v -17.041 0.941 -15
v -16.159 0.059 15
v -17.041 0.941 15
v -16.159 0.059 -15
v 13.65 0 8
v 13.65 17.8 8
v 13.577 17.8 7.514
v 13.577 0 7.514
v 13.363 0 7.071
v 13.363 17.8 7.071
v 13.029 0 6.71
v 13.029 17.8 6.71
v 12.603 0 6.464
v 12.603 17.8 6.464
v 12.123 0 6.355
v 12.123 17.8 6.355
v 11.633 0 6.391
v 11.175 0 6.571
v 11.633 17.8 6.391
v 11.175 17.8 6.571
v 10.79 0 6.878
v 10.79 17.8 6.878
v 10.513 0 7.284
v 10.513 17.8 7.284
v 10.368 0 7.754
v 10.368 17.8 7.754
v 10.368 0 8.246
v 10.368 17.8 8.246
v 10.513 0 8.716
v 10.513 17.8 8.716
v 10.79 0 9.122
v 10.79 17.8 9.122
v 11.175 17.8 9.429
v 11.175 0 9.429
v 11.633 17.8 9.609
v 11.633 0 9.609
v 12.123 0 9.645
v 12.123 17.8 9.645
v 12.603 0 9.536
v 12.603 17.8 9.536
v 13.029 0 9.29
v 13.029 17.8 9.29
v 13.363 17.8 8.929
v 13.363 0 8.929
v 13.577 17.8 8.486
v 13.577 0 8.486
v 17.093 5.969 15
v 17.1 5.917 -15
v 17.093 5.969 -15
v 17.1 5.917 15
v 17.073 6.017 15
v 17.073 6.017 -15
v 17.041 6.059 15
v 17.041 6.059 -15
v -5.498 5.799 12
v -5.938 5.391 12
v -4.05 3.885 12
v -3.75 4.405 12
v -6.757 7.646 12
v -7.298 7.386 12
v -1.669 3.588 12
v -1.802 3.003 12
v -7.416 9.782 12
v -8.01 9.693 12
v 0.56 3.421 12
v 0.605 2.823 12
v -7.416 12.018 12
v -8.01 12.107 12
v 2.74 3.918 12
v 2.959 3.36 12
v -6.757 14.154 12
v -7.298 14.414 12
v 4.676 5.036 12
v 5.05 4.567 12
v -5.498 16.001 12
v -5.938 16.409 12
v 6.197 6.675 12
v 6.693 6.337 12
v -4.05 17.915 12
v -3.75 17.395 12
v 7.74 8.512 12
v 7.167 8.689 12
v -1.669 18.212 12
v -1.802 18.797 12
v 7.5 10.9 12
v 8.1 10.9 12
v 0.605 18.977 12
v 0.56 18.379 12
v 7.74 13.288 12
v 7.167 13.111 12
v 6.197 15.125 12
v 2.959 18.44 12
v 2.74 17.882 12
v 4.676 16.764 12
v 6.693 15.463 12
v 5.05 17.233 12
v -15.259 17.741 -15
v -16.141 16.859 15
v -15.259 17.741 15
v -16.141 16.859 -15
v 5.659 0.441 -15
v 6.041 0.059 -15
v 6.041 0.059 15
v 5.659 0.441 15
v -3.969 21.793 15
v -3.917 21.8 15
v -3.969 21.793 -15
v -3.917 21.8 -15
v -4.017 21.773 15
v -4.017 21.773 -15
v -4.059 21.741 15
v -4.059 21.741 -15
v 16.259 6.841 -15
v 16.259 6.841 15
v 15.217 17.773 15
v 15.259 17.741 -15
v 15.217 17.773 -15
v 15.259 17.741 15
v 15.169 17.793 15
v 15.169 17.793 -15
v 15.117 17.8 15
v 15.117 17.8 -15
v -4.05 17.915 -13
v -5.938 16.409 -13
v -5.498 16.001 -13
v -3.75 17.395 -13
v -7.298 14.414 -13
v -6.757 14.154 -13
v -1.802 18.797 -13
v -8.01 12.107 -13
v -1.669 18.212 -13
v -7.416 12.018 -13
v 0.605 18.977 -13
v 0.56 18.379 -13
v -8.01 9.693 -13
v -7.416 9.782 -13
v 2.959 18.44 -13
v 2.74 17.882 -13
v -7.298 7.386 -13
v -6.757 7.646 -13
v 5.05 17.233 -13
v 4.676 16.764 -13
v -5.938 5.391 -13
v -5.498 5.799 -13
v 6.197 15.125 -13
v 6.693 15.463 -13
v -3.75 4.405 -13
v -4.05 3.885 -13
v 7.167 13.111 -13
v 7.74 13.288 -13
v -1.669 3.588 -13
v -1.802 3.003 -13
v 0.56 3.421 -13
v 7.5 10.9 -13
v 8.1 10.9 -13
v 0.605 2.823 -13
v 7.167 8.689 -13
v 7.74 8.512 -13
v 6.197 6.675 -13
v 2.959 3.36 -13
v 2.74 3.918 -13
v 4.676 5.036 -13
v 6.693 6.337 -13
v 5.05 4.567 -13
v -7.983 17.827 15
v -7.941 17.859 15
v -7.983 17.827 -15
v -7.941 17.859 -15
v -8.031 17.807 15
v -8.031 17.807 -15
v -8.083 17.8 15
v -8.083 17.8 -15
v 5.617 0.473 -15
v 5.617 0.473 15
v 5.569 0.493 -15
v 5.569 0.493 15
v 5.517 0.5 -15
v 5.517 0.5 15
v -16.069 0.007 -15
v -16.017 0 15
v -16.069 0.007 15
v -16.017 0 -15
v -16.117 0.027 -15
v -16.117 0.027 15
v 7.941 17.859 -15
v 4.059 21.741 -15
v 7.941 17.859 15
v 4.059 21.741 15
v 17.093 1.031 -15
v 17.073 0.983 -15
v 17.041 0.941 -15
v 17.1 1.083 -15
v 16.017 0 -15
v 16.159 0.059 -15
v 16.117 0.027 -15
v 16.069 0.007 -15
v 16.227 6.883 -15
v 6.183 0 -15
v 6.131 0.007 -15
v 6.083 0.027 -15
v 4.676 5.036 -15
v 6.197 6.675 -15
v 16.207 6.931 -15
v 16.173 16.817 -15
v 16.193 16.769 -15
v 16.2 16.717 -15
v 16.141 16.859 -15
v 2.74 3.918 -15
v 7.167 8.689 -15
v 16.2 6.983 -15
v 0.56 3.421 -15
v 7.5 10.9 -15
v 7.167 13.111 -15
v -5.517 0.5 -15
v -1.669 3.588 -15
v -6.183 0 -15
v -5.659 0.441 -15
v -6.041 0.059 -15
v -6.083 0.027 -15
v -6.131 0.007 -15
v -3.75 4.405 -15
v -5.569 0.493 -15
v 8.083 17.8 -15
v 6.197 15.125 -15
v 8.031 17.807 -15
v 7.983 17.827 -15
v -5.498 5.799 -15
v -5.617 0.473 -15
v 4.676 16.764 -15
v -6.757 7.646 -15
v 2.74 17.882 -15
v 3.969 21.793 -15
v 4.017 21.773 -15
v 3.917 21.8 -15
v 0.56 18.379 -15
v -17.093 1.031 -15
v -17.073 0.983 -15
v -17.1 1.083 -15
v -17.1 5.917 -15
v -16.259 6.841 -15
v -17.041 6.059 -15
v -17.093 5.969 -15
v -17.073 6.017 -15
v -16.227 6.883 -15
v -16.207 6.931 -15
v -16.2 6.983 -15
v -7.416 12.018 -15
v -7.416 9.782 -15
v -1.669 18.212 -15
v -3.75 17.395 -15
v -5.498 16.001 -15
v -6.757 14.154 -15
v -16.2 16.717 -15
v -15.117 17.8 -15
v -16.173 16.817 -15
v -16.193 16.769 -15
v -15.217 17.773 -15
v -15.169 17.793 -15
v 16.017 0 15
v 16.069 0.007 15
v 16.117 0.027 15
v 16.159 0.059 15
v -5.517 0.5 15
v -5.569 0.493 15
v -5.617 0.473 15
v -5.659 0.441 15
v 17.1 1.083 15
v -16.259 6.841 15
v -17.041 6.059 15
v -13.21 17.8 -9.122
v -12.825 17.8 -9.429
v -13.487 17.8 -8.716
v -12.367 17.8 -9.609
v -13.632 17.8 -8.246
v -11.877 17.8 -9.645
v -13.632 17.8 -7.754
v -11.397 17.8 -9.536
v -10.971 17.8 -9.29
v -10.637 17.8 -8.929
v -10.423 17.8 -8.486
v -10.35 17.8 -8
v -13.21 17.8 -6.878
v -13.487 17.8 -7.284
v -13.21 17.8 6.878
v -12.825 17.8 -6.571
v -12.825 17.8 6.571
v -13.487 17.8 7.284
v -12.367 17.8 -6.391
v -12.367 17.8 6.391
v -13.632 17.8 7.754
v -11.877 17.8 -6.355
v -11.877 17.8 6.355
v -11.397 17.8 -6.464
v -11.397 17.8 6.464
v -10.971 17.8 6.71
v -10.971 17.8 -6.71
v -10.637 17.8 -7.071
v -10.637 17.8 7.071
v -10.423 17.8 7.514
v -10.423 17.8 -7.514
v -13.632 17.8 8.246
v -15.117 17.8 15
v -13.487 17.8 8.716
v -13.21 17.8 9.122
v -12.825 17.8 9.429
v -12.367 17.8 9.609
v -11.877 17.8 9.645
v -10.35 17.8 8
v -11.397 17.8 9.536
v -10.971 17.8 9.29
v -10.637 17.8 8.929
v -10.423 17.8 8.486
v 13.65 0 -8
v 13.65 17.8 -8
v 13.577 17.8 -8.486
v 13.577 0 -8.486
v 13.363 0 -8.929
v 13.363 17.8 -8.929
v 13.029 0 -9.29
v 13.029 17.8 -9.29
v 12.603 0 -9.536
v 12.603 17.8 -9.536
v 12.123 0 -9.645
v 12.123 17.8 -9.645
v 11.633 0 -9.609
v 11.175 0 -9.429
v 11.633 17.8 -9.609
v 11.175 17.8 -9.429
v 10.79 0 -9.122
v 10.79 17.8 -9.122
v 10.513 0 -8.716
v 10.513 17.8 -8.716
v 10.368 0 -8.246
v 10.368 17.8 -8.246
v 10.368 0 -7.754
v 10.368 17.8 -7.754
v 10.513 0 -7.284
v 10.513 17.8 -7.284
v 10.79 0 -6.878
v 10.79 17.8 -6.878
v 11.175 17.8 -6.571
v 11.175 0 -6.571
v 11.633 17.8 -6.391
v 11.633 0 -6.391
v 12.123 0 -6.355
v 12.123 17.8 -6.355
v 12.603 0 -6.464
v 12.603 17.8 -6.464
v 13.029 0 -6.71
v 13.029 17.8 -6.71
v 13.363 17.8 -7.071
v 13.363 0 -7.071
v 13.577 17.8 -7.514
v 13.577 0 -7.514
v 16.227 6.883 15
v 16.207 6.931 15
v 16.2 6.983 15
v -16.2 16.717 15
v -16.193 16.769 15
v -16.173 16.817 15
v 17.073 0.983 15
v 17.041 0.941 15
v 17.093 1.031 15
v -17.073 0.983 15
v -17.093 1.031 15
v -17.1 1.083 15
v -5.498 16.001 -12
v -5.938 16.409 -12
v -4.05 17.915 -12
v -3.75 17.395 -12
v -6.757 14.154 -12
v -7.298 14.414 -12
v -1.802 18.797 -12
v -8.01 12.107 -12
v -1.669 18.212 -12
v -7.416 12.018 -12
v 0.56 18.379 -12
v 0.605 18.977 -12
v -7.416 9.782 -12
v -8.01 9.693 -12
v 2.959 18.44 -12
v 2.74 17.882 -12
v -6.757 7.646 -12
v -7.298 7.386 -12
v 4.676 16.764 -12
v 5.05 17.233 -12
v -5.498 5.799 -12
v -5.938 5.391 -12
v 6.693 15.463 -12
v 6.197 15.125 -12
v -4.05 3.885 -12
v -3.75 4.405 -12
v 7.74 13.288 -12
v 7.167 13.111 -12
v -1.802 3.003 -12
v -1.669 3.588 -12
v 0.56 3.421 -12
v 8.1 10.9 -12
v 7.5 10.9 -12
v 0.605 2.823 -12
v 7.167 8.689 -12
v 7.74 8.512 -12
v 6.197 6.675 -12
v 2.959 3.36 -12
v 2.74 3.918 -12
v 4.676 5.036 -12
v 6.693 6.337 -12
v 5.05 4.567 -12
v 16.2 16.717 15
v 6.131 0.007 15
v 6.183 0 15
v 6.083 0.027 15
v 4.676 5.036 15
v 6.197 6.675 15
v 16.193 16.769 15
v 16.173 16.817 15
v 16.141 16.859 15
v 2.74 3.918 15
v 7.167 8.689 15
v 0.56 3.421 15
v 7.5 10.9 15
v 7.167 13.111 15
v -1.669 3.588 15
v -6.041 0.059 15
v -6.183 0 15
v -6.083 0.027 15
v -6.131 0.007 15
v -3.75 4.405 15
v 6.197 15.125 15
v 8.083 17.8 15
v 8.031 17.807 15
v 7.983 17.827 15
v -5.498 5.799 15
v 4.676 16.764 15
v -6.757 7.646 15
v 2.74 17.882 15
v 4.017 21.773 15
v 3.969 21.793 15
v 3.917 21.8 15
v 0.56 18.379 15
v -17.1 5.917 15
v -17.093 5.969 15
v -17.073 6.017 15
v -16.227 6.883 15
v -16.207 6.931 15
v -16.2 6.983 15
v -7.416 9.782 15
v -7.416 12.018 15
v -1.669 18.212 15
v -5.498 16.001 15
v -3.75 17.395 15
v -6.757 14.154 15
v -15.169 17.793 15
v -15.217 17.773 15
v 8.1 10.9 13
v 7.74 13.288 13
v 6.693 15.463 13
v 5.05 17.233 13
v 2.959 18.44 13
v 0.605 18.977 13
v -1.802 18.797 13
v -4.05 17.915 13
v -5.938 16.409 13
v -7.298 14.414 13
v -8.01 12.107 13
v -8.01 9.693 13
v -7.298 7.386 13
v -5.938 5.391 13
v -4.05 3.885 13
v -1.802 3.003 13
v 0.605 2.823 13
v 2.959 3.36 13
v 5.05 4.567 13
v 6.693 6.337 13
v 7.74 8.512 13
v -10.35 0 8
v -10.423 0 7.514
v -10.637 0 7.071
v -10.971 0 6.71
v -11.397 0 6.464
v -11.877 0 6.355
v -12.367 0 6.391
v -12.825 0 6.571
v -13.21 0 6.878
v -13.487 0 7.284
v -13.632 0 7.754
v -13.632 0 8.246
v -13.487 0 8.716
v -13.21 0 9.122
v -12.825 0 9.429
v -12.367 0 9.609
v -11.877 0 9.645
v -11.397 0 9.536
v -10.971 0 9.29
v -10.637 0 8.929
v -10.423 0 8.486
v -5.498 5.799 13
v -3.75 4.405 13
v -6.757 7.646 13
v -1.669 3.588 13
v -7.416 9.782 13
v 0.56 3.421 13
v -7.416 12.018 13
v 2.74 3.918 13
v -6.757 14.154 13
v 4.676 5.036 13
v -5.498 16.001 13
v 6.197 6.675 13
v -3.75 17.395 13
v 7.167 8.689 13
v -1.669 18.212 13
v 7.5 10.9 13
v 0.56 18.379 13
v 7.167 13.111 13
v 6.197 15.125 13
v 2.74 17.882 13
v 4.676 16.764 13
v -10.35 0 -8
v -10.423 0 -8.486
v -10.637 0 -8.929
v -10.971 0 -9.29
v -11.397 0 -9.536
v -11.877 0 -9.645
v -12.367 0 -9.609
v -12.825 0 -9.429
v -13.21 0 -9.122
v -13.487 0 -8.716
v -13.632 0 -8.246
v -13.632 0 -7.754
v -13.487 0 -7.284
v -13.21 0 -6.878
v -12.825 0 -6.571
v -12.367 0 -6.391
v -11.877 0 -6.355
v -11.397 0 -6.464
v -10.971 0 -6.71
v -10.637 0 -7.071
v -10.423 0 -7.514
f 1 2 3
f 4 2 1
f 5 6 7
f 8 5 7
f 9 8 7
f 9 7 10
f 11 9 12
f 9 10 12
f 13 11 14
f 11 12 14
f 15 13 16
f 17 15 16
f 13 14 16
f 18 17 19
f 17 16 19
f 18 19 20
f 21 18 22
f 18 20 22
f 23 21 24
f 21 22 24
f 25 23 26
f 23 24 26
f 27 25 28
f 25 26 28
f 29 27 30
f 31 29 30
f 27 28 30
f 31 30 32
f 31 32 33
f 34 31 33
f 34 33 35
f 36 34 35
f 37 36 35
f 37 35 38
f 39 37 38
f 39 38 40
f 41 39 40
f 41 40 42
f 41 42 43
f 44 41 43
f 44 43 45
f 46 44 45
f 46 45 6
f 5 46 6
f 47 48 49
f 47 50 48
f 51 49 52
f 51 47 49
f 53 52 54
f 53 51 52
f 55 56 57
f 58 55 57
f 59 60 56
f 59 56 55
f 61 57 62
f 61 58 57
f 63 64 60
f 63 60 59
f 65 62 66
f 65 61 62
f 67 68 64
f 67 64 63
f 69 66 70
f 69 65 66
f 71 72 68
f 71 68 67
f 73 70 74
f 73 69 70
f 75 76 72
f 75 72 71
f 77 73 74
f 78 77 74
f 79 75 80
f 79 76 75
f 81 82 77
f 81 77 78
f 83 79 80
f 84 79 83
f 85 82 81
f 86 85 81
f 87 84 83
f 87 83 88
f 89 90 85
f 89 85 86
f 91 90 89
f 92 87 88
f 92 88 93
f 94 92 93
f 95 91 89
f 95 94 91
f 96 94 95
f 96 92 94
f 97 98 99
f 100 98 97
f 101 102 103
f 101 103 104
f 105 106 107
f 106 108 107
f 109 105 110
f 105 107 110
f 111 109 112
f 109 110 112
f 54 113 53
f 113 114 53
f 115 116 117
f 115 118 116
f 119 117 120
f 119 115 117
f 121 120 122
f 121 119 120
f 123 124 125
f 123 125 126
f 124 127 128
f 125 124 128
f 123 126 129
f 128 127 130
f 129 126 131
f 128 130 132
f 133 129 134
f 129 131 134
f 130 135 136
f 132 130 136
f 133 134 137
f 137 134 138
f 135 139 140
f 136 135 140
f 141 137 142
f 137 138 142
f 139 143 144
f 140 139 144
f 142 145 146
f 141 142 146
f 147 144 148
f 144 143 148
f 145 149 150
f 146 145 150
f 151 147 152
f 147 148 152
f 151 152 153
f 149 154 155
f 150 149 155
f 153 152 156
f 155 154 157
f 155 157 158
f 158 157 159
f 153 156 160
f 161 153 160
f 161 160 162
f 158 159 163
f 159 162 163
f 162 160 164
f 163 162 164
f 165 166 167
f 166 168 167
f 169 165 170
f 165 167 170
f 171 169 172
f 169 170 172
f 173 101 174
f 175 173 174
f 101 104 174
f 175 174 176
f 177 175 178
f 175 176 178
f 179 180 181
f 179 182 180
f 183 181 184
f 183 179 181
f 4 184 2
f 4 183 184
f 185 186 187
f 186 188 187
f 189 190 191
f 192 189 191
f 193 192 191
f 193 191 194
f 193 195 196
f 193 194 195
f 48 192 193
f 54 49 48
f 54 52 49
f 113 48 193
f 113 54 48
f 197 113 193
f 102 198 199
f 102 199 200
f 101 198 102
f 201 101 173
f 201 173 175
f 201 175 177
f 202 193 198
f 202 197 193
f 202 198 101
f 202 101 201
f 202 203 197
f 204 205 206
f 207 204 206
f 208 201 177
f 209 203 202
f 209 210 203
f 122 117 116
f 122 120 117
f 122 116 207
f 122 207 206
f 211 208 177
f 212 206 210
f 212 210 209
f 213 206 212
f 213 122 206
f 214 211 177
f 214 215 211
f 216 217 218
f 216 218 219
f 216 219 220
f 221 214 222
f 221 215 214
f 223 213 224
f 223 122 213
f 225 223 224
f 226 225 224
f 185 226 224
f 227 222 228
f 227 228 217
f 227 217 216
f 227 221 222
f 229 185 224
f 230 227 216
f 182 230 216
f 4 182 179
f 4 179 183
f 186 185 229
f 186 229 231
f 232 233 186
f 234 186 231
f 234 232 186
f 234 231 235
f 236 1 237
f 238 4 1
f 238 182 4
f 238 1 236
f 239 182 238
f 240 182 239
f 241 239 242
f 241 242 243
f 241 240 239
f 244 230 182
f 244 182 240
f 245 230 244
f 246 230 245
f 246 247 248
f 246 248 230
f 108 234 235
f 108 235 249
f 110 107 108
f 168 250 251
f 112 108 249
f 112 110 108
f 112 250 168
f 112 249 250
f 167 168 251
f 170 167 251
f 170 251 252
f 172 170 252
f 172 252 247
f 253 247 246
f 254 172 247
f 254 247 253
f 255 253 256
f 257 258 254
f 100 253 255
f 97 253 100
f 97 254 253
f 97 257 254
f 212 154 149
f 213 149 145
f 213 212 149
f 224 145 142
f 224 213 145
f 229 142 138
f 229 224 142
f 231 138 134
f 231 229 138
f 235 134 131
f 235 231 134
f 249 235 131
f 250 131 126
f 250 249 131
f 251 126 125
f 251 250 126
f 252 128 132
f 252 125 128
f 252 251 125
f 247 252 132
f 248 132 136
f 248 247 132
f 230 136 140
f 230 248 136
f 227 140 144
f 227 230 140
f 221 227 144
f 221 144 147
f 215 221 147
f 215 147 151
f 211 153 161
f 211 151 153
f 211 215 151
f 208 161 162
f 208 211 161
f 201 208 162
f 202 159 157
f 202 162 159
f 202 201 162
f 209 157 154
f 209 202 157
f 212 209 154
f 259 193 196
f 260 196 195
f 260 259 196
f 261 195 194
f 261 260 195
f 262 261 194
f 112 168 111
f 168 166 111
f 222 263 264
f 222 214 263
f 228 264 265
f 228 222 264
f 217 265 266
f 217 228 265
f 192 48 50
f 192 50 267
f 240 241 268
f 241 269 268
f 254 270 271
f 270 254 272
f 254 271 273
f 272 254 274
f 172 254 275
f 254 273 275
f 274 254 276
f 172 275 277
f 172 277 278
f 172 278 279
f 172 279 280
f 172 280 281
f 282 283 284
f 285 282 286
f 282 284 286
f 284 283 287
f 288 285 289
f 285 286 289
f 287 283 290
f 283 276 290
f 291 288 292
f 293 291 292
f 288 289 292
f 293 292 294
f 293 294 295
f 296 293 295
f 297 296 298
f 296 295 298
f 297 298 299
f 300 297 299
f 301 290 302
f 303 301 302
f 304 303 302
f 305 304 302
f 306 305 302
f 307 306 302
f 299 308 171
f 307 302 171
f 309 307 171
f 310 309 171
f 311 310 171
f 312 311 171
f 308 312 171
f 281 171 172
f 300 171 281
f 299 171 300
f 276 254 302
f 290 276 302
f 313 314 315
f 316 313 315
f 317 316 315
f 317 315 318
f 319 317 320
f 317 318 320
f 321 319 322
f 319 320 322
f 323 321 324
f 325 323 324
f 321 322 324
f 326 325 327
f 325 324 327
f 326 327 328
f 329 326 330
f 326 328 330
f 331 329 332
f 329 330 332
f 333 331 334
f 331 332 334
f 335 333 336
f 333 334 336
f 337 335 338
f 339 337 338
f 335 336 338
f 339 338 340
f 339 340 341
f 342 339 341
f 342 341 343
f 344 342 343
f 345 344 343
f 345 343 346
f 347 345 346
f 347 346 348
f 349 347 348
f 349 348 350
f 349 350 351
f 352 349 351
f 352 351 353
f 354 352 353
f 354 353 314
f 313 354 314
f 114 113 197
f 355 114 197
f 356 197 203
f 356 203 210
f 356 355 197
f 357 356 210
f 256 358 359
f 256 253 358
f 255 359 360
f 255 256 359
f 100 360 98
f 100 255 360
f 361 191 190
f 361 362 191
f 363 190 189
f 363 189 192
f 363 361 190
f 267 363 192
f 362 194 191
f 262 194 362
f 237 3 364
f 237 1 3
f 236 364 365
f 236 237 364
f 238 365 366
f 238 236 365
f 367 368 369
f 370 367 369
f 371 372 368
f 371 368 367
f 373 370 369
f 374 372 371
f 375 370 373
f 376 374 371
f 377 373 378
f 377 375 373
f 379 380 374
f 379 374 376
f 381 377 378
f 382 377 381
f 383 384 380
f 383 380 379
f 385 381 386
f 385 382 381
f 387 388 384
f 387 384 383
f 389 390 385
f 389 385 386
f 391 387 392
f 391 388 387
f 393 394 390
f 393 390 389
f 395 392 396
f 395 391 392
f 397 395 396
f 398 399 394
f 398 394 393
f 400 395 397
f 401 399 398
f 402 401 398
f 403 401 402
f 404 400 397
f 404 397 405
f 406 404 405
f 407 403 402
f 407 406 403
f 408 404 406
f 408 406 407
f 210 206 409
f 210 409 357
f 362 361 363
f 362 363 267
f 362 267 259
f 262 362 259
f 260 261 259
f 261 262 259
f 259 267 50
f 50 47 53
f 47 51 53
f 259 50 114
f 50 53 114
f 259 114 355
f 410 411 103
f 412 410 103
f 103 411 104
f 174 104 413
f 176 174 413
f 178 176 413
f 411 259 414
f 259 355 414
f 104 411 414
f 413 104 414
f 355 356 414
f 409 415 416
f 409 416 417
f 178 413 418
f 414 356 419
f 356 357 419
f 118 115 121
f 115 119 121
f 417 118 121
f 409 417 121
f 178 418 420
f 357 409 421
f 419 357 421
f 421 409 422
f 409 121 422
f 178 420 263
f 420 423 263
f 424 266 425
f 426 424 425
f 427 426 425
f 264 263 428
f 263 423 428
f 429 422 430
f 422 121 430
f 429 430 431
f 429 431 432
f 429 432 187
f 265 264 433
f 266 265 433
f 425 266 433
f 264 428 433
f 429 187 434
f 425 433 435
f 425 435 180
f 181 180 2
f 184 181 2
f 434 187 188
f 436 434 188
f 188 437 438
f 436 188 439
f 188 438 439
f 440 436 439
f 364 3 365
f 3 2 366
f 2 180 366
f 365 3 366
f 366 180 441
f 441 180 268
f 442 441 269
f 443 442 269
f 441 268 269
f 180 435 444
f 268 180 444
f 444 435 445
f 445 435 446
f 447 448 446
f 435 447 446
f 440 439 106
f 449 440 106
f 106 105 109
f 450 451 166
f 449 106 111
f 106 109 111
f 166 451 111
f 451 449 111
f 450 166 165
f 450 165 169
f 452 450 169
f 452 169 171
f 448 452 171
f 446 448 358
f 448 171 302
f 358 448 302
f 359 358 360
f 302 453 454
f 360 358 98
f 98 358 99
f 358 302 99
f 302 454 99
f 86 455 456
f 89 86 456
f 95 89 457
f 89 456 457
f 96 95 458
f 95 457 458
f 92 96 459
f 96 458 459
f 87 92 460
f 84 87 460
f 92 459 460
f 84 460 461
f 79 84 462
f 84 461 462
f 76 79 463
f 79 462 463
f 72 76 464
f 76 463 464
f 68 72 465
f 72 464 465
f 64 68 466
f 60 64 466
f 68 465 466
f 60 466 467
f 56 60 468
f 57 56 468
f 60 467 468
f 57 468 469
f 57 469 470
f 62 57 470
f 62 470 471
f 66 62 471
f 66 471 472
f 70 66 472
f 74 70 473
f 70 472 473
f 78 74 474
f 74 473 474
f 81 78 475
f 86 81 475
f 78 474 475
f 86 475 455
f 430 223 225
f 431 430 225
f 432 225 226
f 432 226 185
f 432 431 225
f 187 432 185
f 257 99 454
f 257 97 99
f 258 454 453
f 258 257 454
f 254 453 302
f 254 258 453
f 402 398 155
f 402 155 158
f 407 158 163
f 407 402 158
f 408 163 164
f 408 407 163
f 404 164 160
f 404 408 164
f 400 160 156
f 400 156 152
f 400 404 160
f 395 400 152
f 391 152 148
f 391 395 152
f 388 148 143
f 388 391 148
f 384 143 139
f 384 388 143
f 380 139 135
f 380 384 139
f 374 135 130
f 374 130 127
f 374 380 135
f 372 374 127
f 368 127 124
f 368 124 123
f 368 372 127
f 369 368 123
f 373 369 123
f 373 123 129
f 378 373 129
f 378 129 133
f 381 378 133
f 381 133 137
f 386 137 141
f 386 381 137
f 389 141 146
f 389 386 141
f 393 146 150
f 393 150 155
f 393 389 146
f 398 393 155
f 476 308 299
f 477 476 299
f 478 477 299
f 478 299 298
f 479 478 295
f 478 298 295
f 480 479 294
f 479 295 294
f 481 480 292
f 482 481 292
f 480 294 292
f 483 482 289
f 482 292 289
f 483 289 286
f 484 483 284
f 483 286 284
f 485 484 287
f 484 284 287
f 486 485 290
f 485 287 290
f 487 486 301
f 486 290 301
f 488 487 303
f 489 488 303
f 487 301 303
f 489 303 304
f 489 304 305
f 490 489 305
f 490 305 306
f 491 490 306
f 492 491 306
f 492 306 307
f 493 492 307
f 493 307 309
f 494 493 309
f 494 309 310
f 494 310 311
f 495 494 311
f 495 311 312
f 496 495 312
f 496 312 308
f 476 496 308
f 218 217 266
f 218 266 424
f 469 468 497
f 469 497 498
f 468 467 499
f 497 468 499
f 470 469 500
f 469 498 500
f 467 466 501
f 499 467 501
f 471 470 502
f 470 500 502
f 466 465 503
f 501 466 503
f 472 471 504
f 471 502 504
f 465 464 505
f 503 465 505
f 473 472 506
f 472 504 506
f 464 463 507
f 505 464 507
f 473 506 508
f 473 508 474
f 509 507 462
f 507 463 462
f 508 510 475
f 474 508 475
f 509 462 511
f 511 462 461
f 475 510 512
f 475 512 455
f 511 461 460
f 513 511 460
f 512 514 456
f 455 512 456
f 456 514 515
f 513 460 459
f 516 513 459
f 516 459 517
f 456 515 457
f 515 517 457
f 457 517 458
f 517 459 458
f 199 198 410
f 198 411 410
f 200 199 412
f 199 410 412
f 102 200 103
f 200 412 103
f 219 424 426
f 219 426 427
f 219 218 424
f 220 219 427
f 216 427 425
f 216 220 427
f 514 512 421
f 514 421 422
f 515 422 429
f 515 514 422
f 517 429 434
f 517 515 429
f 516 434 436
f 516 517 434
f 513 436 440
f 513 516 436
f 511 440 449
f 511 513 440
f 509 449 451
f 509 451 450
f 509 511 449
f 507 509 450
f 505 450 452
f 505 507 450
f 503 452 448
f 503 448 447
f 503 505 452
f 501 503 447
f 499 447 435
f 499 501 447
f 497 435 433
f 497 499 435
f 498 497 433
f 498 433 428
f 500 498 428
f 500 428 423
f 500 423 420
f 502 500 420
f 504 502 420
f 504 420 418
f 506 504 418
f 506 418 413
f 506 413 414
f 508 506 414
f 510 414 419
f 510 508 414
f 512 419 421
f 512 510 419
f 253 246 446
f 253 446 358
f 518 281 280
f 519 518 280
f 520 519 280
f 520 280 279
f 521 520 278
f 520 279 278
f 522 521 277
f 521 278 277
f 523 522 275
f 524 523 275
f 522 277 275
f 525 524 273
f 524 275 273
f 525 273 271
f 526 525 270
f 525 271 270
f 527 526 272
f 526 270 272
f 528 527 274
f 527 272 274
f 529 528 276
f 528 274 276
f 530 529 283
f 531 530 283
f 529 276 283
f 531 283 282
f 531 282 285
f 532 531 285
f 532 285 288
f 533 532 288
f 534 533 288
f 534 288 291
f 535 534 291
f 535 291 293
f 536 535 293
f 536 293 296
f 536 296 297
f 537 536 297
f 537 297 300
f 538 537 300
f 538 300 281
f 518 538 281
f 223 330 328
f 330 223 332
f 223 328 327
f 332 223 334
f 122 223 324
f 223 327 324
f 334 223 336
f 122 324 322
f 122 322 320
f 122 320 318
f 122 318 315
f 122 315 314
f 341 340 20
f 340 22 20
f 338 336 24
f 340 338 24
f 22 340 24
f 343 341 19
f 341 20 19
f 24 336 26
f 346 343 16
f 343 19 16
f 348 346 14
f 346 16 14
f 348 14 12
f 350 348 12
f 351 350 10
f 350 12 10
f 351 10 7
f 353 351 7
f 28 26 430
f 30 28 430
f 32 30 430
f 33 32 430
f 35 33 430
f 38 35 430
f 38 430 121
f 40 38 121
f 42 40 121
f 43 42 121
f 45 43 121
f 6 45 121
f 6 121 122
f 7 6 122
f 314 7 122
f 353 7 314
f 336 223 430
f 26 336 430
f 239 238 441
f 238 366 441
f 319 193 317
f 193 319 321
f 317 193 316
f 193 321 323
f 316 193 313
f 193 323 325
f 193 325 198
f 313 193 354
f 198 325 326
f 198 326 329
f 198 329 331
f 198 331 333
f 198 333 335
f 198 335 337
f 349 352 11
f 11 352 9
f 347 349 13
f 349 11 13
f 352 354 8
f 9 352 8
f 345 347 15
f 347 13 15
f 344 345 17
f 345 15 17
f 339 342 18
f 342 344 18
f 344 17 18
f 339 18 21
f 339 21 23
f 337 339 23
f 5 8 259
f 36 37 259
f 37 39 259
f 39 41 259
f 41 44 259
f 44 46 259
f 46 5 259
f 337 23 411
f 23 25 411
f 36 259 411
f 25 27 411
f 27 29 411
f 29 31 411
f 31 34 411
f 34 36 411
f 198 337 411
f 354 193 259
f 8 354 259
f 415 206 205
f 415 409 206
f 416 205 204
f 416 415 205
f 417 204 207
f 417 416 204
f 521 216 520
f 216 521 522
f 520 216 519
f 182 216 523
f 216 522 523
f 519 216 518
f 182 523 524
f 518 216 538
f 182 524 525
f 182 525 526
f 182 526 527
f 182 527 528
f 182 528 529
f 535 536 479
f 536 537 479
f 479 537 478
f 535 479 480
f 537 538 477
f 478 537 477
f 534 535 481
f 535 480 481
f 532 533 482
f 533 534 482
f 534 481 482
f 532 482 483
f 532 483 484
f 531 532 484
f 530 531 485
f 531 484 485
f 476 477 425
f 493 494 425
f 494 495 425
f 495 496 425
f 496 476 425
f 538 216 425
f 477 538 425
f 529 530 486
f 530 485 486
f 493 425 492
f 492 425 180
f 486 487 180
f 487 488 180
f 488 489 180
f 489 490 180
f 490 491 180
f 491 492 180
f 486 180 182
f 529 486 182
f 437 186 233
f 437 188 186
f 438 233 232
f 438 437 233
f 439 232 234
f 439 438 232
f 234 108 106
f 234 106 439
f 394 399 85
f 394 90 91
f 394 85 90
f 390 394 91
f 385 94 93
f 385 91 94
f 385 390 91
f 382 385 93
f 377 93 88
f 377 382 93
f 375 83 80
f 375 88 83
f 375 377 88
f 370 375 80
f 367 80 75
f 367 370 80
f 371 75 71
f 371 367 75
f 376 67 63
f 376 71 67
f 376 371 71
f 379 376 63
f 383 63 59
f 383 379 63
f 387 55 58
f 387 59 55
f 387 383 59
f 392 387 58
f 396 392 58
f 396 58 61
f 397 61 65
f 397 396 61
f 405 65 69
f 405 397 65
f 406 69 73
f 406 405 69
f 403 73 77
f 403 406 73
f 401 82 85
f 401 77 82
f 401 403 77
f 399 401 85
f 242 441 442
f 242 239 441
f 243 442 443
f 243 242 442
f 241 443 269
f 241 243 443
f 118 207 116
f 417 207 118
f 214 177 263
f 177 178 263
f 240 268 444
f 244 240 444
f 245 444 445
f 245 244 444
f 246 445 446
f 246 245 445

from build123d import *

# Parameters (mm, degrees)
ESQUISSE1_R             = 7.5
BOSS_EXTRU_1_DEPTH      = 15
CHANFREIN1_SIZE         = 1
CONG_1_R                = 0.2
ESQUISSE2_R             = 8.1
ENL_V_MAT_EXTRU_1_DEPTH = 1
ENL_V_START             = -1
ESQUISSE3_R             = 8.1
ENL_V_MAT_EXTRU_2_DEPTH = 1
TROU_TARAUD_M41_D       = 3.3


with BuildPart() as part:
    # Esquisse1 → Boss.-Extru.1 (new, symmetric)
    with BuildSketch(Plane.XY):
        Polygon((5.6, 0.5), (-5.6, 0.5), (-6.1, 0), (-17.1, 0), (-17.1, 6), (-16.2, 6.9), (-16.2, 17.8), (-8, 17.8), (-4, 21.8), (4, 21.8), (8, 17.8), (16.2, 17.8), (16.2, 6.9), (17.1, 6), (17.1, 0), (6.1, 0), align=None)
        with Locations((0, 10.9)):
            Circle(ESQUISSE1_R, mode=Mode.SUBTRACT)
    extrude(amount=BOSS_EXTRU_1_DEPTH, both=True)

    # Chanfrein1
    chanfrein1_edges = [part.edges().sort_by_distance(p)[0] for p in [
        (-17.1, 0, 0),
        (-16.2, 17.8, 0),
        (16.2, 17.8, 0),
        (17.1, 0, 0),
    ]]
    chamfer(chanfrein1_edges, length=CHANFREIN1_SIZE)

    # Congé1
    cong_1_edges = [part.edges().sort_by_distance(p)[0] for p in [
        (6.1, 0, 0),
        (5.6, 0.5, 0),
        (-5.6, 0.5, 0),
        (-6.1, 0, 0),
        (-17.1, 6, 0),
        (-16.2, 6.9, 0),
        (-8, 17.8, 0),
        (-4, 21.8, 0),
        (4, 21.8, 0),
        (8, 17.8, 0),
        (16.2, 6.9, 0),
        (17.1, 6, 0),
        (17.1, 1, 0),
        (16.1, 0, 0),
        (-16.1, 0, 0),
        (-17.1, 1, 0),
        (-16.2, 16.8, 0),
        (-15.2, 17.8, 0),
        (15.2, 17.8, 0),
        (16.2, 16.8, 0),
    ]]
    fillet(cong_1_edges, radius=CONG_1_R)

    # Esquisse2 → Enlèv. mat.-Extru.1 (cut)
    with BuildSketch(Plane.XY.offset(13)):
        with Locations((0, 10.9)):
            Circle(ESQUISSE2_R)
    extrude(amount=-ENL_V_MAT_EXTRU_1_DEPTH, mode=Mode.SUBTRACT)

    # Esquisse3 → Enlèv. mat.-Extru.2 (cut)
    with BuildSketch(Plane(origin=(0, 0, -13), x_dir=(-1, 0, 0), z_dir=(0, 0, -1)).offset(ENL_V_START)):
        with Locations(Location((0, 10.9, 0), (0, 0, 180))):
            Circle(ESQUISSE3_R)
    extrude(amount=ENL_V_MAT_EXTRU_2_DEPTH, mode=Mode.SUBTRACT)

    # Trou taraudé M41 (through all)
    with Locations(Plane(origin=(0, 0, 0), x_dir=(-1, 0, 0), z_dir=(0, -1, 0))):
        with Locations((-12, -8), (12, -8), (12, 8), (-12, 8)):
            Hole(TROU_TARAUD_M41_D / 2)


solid = part.part
